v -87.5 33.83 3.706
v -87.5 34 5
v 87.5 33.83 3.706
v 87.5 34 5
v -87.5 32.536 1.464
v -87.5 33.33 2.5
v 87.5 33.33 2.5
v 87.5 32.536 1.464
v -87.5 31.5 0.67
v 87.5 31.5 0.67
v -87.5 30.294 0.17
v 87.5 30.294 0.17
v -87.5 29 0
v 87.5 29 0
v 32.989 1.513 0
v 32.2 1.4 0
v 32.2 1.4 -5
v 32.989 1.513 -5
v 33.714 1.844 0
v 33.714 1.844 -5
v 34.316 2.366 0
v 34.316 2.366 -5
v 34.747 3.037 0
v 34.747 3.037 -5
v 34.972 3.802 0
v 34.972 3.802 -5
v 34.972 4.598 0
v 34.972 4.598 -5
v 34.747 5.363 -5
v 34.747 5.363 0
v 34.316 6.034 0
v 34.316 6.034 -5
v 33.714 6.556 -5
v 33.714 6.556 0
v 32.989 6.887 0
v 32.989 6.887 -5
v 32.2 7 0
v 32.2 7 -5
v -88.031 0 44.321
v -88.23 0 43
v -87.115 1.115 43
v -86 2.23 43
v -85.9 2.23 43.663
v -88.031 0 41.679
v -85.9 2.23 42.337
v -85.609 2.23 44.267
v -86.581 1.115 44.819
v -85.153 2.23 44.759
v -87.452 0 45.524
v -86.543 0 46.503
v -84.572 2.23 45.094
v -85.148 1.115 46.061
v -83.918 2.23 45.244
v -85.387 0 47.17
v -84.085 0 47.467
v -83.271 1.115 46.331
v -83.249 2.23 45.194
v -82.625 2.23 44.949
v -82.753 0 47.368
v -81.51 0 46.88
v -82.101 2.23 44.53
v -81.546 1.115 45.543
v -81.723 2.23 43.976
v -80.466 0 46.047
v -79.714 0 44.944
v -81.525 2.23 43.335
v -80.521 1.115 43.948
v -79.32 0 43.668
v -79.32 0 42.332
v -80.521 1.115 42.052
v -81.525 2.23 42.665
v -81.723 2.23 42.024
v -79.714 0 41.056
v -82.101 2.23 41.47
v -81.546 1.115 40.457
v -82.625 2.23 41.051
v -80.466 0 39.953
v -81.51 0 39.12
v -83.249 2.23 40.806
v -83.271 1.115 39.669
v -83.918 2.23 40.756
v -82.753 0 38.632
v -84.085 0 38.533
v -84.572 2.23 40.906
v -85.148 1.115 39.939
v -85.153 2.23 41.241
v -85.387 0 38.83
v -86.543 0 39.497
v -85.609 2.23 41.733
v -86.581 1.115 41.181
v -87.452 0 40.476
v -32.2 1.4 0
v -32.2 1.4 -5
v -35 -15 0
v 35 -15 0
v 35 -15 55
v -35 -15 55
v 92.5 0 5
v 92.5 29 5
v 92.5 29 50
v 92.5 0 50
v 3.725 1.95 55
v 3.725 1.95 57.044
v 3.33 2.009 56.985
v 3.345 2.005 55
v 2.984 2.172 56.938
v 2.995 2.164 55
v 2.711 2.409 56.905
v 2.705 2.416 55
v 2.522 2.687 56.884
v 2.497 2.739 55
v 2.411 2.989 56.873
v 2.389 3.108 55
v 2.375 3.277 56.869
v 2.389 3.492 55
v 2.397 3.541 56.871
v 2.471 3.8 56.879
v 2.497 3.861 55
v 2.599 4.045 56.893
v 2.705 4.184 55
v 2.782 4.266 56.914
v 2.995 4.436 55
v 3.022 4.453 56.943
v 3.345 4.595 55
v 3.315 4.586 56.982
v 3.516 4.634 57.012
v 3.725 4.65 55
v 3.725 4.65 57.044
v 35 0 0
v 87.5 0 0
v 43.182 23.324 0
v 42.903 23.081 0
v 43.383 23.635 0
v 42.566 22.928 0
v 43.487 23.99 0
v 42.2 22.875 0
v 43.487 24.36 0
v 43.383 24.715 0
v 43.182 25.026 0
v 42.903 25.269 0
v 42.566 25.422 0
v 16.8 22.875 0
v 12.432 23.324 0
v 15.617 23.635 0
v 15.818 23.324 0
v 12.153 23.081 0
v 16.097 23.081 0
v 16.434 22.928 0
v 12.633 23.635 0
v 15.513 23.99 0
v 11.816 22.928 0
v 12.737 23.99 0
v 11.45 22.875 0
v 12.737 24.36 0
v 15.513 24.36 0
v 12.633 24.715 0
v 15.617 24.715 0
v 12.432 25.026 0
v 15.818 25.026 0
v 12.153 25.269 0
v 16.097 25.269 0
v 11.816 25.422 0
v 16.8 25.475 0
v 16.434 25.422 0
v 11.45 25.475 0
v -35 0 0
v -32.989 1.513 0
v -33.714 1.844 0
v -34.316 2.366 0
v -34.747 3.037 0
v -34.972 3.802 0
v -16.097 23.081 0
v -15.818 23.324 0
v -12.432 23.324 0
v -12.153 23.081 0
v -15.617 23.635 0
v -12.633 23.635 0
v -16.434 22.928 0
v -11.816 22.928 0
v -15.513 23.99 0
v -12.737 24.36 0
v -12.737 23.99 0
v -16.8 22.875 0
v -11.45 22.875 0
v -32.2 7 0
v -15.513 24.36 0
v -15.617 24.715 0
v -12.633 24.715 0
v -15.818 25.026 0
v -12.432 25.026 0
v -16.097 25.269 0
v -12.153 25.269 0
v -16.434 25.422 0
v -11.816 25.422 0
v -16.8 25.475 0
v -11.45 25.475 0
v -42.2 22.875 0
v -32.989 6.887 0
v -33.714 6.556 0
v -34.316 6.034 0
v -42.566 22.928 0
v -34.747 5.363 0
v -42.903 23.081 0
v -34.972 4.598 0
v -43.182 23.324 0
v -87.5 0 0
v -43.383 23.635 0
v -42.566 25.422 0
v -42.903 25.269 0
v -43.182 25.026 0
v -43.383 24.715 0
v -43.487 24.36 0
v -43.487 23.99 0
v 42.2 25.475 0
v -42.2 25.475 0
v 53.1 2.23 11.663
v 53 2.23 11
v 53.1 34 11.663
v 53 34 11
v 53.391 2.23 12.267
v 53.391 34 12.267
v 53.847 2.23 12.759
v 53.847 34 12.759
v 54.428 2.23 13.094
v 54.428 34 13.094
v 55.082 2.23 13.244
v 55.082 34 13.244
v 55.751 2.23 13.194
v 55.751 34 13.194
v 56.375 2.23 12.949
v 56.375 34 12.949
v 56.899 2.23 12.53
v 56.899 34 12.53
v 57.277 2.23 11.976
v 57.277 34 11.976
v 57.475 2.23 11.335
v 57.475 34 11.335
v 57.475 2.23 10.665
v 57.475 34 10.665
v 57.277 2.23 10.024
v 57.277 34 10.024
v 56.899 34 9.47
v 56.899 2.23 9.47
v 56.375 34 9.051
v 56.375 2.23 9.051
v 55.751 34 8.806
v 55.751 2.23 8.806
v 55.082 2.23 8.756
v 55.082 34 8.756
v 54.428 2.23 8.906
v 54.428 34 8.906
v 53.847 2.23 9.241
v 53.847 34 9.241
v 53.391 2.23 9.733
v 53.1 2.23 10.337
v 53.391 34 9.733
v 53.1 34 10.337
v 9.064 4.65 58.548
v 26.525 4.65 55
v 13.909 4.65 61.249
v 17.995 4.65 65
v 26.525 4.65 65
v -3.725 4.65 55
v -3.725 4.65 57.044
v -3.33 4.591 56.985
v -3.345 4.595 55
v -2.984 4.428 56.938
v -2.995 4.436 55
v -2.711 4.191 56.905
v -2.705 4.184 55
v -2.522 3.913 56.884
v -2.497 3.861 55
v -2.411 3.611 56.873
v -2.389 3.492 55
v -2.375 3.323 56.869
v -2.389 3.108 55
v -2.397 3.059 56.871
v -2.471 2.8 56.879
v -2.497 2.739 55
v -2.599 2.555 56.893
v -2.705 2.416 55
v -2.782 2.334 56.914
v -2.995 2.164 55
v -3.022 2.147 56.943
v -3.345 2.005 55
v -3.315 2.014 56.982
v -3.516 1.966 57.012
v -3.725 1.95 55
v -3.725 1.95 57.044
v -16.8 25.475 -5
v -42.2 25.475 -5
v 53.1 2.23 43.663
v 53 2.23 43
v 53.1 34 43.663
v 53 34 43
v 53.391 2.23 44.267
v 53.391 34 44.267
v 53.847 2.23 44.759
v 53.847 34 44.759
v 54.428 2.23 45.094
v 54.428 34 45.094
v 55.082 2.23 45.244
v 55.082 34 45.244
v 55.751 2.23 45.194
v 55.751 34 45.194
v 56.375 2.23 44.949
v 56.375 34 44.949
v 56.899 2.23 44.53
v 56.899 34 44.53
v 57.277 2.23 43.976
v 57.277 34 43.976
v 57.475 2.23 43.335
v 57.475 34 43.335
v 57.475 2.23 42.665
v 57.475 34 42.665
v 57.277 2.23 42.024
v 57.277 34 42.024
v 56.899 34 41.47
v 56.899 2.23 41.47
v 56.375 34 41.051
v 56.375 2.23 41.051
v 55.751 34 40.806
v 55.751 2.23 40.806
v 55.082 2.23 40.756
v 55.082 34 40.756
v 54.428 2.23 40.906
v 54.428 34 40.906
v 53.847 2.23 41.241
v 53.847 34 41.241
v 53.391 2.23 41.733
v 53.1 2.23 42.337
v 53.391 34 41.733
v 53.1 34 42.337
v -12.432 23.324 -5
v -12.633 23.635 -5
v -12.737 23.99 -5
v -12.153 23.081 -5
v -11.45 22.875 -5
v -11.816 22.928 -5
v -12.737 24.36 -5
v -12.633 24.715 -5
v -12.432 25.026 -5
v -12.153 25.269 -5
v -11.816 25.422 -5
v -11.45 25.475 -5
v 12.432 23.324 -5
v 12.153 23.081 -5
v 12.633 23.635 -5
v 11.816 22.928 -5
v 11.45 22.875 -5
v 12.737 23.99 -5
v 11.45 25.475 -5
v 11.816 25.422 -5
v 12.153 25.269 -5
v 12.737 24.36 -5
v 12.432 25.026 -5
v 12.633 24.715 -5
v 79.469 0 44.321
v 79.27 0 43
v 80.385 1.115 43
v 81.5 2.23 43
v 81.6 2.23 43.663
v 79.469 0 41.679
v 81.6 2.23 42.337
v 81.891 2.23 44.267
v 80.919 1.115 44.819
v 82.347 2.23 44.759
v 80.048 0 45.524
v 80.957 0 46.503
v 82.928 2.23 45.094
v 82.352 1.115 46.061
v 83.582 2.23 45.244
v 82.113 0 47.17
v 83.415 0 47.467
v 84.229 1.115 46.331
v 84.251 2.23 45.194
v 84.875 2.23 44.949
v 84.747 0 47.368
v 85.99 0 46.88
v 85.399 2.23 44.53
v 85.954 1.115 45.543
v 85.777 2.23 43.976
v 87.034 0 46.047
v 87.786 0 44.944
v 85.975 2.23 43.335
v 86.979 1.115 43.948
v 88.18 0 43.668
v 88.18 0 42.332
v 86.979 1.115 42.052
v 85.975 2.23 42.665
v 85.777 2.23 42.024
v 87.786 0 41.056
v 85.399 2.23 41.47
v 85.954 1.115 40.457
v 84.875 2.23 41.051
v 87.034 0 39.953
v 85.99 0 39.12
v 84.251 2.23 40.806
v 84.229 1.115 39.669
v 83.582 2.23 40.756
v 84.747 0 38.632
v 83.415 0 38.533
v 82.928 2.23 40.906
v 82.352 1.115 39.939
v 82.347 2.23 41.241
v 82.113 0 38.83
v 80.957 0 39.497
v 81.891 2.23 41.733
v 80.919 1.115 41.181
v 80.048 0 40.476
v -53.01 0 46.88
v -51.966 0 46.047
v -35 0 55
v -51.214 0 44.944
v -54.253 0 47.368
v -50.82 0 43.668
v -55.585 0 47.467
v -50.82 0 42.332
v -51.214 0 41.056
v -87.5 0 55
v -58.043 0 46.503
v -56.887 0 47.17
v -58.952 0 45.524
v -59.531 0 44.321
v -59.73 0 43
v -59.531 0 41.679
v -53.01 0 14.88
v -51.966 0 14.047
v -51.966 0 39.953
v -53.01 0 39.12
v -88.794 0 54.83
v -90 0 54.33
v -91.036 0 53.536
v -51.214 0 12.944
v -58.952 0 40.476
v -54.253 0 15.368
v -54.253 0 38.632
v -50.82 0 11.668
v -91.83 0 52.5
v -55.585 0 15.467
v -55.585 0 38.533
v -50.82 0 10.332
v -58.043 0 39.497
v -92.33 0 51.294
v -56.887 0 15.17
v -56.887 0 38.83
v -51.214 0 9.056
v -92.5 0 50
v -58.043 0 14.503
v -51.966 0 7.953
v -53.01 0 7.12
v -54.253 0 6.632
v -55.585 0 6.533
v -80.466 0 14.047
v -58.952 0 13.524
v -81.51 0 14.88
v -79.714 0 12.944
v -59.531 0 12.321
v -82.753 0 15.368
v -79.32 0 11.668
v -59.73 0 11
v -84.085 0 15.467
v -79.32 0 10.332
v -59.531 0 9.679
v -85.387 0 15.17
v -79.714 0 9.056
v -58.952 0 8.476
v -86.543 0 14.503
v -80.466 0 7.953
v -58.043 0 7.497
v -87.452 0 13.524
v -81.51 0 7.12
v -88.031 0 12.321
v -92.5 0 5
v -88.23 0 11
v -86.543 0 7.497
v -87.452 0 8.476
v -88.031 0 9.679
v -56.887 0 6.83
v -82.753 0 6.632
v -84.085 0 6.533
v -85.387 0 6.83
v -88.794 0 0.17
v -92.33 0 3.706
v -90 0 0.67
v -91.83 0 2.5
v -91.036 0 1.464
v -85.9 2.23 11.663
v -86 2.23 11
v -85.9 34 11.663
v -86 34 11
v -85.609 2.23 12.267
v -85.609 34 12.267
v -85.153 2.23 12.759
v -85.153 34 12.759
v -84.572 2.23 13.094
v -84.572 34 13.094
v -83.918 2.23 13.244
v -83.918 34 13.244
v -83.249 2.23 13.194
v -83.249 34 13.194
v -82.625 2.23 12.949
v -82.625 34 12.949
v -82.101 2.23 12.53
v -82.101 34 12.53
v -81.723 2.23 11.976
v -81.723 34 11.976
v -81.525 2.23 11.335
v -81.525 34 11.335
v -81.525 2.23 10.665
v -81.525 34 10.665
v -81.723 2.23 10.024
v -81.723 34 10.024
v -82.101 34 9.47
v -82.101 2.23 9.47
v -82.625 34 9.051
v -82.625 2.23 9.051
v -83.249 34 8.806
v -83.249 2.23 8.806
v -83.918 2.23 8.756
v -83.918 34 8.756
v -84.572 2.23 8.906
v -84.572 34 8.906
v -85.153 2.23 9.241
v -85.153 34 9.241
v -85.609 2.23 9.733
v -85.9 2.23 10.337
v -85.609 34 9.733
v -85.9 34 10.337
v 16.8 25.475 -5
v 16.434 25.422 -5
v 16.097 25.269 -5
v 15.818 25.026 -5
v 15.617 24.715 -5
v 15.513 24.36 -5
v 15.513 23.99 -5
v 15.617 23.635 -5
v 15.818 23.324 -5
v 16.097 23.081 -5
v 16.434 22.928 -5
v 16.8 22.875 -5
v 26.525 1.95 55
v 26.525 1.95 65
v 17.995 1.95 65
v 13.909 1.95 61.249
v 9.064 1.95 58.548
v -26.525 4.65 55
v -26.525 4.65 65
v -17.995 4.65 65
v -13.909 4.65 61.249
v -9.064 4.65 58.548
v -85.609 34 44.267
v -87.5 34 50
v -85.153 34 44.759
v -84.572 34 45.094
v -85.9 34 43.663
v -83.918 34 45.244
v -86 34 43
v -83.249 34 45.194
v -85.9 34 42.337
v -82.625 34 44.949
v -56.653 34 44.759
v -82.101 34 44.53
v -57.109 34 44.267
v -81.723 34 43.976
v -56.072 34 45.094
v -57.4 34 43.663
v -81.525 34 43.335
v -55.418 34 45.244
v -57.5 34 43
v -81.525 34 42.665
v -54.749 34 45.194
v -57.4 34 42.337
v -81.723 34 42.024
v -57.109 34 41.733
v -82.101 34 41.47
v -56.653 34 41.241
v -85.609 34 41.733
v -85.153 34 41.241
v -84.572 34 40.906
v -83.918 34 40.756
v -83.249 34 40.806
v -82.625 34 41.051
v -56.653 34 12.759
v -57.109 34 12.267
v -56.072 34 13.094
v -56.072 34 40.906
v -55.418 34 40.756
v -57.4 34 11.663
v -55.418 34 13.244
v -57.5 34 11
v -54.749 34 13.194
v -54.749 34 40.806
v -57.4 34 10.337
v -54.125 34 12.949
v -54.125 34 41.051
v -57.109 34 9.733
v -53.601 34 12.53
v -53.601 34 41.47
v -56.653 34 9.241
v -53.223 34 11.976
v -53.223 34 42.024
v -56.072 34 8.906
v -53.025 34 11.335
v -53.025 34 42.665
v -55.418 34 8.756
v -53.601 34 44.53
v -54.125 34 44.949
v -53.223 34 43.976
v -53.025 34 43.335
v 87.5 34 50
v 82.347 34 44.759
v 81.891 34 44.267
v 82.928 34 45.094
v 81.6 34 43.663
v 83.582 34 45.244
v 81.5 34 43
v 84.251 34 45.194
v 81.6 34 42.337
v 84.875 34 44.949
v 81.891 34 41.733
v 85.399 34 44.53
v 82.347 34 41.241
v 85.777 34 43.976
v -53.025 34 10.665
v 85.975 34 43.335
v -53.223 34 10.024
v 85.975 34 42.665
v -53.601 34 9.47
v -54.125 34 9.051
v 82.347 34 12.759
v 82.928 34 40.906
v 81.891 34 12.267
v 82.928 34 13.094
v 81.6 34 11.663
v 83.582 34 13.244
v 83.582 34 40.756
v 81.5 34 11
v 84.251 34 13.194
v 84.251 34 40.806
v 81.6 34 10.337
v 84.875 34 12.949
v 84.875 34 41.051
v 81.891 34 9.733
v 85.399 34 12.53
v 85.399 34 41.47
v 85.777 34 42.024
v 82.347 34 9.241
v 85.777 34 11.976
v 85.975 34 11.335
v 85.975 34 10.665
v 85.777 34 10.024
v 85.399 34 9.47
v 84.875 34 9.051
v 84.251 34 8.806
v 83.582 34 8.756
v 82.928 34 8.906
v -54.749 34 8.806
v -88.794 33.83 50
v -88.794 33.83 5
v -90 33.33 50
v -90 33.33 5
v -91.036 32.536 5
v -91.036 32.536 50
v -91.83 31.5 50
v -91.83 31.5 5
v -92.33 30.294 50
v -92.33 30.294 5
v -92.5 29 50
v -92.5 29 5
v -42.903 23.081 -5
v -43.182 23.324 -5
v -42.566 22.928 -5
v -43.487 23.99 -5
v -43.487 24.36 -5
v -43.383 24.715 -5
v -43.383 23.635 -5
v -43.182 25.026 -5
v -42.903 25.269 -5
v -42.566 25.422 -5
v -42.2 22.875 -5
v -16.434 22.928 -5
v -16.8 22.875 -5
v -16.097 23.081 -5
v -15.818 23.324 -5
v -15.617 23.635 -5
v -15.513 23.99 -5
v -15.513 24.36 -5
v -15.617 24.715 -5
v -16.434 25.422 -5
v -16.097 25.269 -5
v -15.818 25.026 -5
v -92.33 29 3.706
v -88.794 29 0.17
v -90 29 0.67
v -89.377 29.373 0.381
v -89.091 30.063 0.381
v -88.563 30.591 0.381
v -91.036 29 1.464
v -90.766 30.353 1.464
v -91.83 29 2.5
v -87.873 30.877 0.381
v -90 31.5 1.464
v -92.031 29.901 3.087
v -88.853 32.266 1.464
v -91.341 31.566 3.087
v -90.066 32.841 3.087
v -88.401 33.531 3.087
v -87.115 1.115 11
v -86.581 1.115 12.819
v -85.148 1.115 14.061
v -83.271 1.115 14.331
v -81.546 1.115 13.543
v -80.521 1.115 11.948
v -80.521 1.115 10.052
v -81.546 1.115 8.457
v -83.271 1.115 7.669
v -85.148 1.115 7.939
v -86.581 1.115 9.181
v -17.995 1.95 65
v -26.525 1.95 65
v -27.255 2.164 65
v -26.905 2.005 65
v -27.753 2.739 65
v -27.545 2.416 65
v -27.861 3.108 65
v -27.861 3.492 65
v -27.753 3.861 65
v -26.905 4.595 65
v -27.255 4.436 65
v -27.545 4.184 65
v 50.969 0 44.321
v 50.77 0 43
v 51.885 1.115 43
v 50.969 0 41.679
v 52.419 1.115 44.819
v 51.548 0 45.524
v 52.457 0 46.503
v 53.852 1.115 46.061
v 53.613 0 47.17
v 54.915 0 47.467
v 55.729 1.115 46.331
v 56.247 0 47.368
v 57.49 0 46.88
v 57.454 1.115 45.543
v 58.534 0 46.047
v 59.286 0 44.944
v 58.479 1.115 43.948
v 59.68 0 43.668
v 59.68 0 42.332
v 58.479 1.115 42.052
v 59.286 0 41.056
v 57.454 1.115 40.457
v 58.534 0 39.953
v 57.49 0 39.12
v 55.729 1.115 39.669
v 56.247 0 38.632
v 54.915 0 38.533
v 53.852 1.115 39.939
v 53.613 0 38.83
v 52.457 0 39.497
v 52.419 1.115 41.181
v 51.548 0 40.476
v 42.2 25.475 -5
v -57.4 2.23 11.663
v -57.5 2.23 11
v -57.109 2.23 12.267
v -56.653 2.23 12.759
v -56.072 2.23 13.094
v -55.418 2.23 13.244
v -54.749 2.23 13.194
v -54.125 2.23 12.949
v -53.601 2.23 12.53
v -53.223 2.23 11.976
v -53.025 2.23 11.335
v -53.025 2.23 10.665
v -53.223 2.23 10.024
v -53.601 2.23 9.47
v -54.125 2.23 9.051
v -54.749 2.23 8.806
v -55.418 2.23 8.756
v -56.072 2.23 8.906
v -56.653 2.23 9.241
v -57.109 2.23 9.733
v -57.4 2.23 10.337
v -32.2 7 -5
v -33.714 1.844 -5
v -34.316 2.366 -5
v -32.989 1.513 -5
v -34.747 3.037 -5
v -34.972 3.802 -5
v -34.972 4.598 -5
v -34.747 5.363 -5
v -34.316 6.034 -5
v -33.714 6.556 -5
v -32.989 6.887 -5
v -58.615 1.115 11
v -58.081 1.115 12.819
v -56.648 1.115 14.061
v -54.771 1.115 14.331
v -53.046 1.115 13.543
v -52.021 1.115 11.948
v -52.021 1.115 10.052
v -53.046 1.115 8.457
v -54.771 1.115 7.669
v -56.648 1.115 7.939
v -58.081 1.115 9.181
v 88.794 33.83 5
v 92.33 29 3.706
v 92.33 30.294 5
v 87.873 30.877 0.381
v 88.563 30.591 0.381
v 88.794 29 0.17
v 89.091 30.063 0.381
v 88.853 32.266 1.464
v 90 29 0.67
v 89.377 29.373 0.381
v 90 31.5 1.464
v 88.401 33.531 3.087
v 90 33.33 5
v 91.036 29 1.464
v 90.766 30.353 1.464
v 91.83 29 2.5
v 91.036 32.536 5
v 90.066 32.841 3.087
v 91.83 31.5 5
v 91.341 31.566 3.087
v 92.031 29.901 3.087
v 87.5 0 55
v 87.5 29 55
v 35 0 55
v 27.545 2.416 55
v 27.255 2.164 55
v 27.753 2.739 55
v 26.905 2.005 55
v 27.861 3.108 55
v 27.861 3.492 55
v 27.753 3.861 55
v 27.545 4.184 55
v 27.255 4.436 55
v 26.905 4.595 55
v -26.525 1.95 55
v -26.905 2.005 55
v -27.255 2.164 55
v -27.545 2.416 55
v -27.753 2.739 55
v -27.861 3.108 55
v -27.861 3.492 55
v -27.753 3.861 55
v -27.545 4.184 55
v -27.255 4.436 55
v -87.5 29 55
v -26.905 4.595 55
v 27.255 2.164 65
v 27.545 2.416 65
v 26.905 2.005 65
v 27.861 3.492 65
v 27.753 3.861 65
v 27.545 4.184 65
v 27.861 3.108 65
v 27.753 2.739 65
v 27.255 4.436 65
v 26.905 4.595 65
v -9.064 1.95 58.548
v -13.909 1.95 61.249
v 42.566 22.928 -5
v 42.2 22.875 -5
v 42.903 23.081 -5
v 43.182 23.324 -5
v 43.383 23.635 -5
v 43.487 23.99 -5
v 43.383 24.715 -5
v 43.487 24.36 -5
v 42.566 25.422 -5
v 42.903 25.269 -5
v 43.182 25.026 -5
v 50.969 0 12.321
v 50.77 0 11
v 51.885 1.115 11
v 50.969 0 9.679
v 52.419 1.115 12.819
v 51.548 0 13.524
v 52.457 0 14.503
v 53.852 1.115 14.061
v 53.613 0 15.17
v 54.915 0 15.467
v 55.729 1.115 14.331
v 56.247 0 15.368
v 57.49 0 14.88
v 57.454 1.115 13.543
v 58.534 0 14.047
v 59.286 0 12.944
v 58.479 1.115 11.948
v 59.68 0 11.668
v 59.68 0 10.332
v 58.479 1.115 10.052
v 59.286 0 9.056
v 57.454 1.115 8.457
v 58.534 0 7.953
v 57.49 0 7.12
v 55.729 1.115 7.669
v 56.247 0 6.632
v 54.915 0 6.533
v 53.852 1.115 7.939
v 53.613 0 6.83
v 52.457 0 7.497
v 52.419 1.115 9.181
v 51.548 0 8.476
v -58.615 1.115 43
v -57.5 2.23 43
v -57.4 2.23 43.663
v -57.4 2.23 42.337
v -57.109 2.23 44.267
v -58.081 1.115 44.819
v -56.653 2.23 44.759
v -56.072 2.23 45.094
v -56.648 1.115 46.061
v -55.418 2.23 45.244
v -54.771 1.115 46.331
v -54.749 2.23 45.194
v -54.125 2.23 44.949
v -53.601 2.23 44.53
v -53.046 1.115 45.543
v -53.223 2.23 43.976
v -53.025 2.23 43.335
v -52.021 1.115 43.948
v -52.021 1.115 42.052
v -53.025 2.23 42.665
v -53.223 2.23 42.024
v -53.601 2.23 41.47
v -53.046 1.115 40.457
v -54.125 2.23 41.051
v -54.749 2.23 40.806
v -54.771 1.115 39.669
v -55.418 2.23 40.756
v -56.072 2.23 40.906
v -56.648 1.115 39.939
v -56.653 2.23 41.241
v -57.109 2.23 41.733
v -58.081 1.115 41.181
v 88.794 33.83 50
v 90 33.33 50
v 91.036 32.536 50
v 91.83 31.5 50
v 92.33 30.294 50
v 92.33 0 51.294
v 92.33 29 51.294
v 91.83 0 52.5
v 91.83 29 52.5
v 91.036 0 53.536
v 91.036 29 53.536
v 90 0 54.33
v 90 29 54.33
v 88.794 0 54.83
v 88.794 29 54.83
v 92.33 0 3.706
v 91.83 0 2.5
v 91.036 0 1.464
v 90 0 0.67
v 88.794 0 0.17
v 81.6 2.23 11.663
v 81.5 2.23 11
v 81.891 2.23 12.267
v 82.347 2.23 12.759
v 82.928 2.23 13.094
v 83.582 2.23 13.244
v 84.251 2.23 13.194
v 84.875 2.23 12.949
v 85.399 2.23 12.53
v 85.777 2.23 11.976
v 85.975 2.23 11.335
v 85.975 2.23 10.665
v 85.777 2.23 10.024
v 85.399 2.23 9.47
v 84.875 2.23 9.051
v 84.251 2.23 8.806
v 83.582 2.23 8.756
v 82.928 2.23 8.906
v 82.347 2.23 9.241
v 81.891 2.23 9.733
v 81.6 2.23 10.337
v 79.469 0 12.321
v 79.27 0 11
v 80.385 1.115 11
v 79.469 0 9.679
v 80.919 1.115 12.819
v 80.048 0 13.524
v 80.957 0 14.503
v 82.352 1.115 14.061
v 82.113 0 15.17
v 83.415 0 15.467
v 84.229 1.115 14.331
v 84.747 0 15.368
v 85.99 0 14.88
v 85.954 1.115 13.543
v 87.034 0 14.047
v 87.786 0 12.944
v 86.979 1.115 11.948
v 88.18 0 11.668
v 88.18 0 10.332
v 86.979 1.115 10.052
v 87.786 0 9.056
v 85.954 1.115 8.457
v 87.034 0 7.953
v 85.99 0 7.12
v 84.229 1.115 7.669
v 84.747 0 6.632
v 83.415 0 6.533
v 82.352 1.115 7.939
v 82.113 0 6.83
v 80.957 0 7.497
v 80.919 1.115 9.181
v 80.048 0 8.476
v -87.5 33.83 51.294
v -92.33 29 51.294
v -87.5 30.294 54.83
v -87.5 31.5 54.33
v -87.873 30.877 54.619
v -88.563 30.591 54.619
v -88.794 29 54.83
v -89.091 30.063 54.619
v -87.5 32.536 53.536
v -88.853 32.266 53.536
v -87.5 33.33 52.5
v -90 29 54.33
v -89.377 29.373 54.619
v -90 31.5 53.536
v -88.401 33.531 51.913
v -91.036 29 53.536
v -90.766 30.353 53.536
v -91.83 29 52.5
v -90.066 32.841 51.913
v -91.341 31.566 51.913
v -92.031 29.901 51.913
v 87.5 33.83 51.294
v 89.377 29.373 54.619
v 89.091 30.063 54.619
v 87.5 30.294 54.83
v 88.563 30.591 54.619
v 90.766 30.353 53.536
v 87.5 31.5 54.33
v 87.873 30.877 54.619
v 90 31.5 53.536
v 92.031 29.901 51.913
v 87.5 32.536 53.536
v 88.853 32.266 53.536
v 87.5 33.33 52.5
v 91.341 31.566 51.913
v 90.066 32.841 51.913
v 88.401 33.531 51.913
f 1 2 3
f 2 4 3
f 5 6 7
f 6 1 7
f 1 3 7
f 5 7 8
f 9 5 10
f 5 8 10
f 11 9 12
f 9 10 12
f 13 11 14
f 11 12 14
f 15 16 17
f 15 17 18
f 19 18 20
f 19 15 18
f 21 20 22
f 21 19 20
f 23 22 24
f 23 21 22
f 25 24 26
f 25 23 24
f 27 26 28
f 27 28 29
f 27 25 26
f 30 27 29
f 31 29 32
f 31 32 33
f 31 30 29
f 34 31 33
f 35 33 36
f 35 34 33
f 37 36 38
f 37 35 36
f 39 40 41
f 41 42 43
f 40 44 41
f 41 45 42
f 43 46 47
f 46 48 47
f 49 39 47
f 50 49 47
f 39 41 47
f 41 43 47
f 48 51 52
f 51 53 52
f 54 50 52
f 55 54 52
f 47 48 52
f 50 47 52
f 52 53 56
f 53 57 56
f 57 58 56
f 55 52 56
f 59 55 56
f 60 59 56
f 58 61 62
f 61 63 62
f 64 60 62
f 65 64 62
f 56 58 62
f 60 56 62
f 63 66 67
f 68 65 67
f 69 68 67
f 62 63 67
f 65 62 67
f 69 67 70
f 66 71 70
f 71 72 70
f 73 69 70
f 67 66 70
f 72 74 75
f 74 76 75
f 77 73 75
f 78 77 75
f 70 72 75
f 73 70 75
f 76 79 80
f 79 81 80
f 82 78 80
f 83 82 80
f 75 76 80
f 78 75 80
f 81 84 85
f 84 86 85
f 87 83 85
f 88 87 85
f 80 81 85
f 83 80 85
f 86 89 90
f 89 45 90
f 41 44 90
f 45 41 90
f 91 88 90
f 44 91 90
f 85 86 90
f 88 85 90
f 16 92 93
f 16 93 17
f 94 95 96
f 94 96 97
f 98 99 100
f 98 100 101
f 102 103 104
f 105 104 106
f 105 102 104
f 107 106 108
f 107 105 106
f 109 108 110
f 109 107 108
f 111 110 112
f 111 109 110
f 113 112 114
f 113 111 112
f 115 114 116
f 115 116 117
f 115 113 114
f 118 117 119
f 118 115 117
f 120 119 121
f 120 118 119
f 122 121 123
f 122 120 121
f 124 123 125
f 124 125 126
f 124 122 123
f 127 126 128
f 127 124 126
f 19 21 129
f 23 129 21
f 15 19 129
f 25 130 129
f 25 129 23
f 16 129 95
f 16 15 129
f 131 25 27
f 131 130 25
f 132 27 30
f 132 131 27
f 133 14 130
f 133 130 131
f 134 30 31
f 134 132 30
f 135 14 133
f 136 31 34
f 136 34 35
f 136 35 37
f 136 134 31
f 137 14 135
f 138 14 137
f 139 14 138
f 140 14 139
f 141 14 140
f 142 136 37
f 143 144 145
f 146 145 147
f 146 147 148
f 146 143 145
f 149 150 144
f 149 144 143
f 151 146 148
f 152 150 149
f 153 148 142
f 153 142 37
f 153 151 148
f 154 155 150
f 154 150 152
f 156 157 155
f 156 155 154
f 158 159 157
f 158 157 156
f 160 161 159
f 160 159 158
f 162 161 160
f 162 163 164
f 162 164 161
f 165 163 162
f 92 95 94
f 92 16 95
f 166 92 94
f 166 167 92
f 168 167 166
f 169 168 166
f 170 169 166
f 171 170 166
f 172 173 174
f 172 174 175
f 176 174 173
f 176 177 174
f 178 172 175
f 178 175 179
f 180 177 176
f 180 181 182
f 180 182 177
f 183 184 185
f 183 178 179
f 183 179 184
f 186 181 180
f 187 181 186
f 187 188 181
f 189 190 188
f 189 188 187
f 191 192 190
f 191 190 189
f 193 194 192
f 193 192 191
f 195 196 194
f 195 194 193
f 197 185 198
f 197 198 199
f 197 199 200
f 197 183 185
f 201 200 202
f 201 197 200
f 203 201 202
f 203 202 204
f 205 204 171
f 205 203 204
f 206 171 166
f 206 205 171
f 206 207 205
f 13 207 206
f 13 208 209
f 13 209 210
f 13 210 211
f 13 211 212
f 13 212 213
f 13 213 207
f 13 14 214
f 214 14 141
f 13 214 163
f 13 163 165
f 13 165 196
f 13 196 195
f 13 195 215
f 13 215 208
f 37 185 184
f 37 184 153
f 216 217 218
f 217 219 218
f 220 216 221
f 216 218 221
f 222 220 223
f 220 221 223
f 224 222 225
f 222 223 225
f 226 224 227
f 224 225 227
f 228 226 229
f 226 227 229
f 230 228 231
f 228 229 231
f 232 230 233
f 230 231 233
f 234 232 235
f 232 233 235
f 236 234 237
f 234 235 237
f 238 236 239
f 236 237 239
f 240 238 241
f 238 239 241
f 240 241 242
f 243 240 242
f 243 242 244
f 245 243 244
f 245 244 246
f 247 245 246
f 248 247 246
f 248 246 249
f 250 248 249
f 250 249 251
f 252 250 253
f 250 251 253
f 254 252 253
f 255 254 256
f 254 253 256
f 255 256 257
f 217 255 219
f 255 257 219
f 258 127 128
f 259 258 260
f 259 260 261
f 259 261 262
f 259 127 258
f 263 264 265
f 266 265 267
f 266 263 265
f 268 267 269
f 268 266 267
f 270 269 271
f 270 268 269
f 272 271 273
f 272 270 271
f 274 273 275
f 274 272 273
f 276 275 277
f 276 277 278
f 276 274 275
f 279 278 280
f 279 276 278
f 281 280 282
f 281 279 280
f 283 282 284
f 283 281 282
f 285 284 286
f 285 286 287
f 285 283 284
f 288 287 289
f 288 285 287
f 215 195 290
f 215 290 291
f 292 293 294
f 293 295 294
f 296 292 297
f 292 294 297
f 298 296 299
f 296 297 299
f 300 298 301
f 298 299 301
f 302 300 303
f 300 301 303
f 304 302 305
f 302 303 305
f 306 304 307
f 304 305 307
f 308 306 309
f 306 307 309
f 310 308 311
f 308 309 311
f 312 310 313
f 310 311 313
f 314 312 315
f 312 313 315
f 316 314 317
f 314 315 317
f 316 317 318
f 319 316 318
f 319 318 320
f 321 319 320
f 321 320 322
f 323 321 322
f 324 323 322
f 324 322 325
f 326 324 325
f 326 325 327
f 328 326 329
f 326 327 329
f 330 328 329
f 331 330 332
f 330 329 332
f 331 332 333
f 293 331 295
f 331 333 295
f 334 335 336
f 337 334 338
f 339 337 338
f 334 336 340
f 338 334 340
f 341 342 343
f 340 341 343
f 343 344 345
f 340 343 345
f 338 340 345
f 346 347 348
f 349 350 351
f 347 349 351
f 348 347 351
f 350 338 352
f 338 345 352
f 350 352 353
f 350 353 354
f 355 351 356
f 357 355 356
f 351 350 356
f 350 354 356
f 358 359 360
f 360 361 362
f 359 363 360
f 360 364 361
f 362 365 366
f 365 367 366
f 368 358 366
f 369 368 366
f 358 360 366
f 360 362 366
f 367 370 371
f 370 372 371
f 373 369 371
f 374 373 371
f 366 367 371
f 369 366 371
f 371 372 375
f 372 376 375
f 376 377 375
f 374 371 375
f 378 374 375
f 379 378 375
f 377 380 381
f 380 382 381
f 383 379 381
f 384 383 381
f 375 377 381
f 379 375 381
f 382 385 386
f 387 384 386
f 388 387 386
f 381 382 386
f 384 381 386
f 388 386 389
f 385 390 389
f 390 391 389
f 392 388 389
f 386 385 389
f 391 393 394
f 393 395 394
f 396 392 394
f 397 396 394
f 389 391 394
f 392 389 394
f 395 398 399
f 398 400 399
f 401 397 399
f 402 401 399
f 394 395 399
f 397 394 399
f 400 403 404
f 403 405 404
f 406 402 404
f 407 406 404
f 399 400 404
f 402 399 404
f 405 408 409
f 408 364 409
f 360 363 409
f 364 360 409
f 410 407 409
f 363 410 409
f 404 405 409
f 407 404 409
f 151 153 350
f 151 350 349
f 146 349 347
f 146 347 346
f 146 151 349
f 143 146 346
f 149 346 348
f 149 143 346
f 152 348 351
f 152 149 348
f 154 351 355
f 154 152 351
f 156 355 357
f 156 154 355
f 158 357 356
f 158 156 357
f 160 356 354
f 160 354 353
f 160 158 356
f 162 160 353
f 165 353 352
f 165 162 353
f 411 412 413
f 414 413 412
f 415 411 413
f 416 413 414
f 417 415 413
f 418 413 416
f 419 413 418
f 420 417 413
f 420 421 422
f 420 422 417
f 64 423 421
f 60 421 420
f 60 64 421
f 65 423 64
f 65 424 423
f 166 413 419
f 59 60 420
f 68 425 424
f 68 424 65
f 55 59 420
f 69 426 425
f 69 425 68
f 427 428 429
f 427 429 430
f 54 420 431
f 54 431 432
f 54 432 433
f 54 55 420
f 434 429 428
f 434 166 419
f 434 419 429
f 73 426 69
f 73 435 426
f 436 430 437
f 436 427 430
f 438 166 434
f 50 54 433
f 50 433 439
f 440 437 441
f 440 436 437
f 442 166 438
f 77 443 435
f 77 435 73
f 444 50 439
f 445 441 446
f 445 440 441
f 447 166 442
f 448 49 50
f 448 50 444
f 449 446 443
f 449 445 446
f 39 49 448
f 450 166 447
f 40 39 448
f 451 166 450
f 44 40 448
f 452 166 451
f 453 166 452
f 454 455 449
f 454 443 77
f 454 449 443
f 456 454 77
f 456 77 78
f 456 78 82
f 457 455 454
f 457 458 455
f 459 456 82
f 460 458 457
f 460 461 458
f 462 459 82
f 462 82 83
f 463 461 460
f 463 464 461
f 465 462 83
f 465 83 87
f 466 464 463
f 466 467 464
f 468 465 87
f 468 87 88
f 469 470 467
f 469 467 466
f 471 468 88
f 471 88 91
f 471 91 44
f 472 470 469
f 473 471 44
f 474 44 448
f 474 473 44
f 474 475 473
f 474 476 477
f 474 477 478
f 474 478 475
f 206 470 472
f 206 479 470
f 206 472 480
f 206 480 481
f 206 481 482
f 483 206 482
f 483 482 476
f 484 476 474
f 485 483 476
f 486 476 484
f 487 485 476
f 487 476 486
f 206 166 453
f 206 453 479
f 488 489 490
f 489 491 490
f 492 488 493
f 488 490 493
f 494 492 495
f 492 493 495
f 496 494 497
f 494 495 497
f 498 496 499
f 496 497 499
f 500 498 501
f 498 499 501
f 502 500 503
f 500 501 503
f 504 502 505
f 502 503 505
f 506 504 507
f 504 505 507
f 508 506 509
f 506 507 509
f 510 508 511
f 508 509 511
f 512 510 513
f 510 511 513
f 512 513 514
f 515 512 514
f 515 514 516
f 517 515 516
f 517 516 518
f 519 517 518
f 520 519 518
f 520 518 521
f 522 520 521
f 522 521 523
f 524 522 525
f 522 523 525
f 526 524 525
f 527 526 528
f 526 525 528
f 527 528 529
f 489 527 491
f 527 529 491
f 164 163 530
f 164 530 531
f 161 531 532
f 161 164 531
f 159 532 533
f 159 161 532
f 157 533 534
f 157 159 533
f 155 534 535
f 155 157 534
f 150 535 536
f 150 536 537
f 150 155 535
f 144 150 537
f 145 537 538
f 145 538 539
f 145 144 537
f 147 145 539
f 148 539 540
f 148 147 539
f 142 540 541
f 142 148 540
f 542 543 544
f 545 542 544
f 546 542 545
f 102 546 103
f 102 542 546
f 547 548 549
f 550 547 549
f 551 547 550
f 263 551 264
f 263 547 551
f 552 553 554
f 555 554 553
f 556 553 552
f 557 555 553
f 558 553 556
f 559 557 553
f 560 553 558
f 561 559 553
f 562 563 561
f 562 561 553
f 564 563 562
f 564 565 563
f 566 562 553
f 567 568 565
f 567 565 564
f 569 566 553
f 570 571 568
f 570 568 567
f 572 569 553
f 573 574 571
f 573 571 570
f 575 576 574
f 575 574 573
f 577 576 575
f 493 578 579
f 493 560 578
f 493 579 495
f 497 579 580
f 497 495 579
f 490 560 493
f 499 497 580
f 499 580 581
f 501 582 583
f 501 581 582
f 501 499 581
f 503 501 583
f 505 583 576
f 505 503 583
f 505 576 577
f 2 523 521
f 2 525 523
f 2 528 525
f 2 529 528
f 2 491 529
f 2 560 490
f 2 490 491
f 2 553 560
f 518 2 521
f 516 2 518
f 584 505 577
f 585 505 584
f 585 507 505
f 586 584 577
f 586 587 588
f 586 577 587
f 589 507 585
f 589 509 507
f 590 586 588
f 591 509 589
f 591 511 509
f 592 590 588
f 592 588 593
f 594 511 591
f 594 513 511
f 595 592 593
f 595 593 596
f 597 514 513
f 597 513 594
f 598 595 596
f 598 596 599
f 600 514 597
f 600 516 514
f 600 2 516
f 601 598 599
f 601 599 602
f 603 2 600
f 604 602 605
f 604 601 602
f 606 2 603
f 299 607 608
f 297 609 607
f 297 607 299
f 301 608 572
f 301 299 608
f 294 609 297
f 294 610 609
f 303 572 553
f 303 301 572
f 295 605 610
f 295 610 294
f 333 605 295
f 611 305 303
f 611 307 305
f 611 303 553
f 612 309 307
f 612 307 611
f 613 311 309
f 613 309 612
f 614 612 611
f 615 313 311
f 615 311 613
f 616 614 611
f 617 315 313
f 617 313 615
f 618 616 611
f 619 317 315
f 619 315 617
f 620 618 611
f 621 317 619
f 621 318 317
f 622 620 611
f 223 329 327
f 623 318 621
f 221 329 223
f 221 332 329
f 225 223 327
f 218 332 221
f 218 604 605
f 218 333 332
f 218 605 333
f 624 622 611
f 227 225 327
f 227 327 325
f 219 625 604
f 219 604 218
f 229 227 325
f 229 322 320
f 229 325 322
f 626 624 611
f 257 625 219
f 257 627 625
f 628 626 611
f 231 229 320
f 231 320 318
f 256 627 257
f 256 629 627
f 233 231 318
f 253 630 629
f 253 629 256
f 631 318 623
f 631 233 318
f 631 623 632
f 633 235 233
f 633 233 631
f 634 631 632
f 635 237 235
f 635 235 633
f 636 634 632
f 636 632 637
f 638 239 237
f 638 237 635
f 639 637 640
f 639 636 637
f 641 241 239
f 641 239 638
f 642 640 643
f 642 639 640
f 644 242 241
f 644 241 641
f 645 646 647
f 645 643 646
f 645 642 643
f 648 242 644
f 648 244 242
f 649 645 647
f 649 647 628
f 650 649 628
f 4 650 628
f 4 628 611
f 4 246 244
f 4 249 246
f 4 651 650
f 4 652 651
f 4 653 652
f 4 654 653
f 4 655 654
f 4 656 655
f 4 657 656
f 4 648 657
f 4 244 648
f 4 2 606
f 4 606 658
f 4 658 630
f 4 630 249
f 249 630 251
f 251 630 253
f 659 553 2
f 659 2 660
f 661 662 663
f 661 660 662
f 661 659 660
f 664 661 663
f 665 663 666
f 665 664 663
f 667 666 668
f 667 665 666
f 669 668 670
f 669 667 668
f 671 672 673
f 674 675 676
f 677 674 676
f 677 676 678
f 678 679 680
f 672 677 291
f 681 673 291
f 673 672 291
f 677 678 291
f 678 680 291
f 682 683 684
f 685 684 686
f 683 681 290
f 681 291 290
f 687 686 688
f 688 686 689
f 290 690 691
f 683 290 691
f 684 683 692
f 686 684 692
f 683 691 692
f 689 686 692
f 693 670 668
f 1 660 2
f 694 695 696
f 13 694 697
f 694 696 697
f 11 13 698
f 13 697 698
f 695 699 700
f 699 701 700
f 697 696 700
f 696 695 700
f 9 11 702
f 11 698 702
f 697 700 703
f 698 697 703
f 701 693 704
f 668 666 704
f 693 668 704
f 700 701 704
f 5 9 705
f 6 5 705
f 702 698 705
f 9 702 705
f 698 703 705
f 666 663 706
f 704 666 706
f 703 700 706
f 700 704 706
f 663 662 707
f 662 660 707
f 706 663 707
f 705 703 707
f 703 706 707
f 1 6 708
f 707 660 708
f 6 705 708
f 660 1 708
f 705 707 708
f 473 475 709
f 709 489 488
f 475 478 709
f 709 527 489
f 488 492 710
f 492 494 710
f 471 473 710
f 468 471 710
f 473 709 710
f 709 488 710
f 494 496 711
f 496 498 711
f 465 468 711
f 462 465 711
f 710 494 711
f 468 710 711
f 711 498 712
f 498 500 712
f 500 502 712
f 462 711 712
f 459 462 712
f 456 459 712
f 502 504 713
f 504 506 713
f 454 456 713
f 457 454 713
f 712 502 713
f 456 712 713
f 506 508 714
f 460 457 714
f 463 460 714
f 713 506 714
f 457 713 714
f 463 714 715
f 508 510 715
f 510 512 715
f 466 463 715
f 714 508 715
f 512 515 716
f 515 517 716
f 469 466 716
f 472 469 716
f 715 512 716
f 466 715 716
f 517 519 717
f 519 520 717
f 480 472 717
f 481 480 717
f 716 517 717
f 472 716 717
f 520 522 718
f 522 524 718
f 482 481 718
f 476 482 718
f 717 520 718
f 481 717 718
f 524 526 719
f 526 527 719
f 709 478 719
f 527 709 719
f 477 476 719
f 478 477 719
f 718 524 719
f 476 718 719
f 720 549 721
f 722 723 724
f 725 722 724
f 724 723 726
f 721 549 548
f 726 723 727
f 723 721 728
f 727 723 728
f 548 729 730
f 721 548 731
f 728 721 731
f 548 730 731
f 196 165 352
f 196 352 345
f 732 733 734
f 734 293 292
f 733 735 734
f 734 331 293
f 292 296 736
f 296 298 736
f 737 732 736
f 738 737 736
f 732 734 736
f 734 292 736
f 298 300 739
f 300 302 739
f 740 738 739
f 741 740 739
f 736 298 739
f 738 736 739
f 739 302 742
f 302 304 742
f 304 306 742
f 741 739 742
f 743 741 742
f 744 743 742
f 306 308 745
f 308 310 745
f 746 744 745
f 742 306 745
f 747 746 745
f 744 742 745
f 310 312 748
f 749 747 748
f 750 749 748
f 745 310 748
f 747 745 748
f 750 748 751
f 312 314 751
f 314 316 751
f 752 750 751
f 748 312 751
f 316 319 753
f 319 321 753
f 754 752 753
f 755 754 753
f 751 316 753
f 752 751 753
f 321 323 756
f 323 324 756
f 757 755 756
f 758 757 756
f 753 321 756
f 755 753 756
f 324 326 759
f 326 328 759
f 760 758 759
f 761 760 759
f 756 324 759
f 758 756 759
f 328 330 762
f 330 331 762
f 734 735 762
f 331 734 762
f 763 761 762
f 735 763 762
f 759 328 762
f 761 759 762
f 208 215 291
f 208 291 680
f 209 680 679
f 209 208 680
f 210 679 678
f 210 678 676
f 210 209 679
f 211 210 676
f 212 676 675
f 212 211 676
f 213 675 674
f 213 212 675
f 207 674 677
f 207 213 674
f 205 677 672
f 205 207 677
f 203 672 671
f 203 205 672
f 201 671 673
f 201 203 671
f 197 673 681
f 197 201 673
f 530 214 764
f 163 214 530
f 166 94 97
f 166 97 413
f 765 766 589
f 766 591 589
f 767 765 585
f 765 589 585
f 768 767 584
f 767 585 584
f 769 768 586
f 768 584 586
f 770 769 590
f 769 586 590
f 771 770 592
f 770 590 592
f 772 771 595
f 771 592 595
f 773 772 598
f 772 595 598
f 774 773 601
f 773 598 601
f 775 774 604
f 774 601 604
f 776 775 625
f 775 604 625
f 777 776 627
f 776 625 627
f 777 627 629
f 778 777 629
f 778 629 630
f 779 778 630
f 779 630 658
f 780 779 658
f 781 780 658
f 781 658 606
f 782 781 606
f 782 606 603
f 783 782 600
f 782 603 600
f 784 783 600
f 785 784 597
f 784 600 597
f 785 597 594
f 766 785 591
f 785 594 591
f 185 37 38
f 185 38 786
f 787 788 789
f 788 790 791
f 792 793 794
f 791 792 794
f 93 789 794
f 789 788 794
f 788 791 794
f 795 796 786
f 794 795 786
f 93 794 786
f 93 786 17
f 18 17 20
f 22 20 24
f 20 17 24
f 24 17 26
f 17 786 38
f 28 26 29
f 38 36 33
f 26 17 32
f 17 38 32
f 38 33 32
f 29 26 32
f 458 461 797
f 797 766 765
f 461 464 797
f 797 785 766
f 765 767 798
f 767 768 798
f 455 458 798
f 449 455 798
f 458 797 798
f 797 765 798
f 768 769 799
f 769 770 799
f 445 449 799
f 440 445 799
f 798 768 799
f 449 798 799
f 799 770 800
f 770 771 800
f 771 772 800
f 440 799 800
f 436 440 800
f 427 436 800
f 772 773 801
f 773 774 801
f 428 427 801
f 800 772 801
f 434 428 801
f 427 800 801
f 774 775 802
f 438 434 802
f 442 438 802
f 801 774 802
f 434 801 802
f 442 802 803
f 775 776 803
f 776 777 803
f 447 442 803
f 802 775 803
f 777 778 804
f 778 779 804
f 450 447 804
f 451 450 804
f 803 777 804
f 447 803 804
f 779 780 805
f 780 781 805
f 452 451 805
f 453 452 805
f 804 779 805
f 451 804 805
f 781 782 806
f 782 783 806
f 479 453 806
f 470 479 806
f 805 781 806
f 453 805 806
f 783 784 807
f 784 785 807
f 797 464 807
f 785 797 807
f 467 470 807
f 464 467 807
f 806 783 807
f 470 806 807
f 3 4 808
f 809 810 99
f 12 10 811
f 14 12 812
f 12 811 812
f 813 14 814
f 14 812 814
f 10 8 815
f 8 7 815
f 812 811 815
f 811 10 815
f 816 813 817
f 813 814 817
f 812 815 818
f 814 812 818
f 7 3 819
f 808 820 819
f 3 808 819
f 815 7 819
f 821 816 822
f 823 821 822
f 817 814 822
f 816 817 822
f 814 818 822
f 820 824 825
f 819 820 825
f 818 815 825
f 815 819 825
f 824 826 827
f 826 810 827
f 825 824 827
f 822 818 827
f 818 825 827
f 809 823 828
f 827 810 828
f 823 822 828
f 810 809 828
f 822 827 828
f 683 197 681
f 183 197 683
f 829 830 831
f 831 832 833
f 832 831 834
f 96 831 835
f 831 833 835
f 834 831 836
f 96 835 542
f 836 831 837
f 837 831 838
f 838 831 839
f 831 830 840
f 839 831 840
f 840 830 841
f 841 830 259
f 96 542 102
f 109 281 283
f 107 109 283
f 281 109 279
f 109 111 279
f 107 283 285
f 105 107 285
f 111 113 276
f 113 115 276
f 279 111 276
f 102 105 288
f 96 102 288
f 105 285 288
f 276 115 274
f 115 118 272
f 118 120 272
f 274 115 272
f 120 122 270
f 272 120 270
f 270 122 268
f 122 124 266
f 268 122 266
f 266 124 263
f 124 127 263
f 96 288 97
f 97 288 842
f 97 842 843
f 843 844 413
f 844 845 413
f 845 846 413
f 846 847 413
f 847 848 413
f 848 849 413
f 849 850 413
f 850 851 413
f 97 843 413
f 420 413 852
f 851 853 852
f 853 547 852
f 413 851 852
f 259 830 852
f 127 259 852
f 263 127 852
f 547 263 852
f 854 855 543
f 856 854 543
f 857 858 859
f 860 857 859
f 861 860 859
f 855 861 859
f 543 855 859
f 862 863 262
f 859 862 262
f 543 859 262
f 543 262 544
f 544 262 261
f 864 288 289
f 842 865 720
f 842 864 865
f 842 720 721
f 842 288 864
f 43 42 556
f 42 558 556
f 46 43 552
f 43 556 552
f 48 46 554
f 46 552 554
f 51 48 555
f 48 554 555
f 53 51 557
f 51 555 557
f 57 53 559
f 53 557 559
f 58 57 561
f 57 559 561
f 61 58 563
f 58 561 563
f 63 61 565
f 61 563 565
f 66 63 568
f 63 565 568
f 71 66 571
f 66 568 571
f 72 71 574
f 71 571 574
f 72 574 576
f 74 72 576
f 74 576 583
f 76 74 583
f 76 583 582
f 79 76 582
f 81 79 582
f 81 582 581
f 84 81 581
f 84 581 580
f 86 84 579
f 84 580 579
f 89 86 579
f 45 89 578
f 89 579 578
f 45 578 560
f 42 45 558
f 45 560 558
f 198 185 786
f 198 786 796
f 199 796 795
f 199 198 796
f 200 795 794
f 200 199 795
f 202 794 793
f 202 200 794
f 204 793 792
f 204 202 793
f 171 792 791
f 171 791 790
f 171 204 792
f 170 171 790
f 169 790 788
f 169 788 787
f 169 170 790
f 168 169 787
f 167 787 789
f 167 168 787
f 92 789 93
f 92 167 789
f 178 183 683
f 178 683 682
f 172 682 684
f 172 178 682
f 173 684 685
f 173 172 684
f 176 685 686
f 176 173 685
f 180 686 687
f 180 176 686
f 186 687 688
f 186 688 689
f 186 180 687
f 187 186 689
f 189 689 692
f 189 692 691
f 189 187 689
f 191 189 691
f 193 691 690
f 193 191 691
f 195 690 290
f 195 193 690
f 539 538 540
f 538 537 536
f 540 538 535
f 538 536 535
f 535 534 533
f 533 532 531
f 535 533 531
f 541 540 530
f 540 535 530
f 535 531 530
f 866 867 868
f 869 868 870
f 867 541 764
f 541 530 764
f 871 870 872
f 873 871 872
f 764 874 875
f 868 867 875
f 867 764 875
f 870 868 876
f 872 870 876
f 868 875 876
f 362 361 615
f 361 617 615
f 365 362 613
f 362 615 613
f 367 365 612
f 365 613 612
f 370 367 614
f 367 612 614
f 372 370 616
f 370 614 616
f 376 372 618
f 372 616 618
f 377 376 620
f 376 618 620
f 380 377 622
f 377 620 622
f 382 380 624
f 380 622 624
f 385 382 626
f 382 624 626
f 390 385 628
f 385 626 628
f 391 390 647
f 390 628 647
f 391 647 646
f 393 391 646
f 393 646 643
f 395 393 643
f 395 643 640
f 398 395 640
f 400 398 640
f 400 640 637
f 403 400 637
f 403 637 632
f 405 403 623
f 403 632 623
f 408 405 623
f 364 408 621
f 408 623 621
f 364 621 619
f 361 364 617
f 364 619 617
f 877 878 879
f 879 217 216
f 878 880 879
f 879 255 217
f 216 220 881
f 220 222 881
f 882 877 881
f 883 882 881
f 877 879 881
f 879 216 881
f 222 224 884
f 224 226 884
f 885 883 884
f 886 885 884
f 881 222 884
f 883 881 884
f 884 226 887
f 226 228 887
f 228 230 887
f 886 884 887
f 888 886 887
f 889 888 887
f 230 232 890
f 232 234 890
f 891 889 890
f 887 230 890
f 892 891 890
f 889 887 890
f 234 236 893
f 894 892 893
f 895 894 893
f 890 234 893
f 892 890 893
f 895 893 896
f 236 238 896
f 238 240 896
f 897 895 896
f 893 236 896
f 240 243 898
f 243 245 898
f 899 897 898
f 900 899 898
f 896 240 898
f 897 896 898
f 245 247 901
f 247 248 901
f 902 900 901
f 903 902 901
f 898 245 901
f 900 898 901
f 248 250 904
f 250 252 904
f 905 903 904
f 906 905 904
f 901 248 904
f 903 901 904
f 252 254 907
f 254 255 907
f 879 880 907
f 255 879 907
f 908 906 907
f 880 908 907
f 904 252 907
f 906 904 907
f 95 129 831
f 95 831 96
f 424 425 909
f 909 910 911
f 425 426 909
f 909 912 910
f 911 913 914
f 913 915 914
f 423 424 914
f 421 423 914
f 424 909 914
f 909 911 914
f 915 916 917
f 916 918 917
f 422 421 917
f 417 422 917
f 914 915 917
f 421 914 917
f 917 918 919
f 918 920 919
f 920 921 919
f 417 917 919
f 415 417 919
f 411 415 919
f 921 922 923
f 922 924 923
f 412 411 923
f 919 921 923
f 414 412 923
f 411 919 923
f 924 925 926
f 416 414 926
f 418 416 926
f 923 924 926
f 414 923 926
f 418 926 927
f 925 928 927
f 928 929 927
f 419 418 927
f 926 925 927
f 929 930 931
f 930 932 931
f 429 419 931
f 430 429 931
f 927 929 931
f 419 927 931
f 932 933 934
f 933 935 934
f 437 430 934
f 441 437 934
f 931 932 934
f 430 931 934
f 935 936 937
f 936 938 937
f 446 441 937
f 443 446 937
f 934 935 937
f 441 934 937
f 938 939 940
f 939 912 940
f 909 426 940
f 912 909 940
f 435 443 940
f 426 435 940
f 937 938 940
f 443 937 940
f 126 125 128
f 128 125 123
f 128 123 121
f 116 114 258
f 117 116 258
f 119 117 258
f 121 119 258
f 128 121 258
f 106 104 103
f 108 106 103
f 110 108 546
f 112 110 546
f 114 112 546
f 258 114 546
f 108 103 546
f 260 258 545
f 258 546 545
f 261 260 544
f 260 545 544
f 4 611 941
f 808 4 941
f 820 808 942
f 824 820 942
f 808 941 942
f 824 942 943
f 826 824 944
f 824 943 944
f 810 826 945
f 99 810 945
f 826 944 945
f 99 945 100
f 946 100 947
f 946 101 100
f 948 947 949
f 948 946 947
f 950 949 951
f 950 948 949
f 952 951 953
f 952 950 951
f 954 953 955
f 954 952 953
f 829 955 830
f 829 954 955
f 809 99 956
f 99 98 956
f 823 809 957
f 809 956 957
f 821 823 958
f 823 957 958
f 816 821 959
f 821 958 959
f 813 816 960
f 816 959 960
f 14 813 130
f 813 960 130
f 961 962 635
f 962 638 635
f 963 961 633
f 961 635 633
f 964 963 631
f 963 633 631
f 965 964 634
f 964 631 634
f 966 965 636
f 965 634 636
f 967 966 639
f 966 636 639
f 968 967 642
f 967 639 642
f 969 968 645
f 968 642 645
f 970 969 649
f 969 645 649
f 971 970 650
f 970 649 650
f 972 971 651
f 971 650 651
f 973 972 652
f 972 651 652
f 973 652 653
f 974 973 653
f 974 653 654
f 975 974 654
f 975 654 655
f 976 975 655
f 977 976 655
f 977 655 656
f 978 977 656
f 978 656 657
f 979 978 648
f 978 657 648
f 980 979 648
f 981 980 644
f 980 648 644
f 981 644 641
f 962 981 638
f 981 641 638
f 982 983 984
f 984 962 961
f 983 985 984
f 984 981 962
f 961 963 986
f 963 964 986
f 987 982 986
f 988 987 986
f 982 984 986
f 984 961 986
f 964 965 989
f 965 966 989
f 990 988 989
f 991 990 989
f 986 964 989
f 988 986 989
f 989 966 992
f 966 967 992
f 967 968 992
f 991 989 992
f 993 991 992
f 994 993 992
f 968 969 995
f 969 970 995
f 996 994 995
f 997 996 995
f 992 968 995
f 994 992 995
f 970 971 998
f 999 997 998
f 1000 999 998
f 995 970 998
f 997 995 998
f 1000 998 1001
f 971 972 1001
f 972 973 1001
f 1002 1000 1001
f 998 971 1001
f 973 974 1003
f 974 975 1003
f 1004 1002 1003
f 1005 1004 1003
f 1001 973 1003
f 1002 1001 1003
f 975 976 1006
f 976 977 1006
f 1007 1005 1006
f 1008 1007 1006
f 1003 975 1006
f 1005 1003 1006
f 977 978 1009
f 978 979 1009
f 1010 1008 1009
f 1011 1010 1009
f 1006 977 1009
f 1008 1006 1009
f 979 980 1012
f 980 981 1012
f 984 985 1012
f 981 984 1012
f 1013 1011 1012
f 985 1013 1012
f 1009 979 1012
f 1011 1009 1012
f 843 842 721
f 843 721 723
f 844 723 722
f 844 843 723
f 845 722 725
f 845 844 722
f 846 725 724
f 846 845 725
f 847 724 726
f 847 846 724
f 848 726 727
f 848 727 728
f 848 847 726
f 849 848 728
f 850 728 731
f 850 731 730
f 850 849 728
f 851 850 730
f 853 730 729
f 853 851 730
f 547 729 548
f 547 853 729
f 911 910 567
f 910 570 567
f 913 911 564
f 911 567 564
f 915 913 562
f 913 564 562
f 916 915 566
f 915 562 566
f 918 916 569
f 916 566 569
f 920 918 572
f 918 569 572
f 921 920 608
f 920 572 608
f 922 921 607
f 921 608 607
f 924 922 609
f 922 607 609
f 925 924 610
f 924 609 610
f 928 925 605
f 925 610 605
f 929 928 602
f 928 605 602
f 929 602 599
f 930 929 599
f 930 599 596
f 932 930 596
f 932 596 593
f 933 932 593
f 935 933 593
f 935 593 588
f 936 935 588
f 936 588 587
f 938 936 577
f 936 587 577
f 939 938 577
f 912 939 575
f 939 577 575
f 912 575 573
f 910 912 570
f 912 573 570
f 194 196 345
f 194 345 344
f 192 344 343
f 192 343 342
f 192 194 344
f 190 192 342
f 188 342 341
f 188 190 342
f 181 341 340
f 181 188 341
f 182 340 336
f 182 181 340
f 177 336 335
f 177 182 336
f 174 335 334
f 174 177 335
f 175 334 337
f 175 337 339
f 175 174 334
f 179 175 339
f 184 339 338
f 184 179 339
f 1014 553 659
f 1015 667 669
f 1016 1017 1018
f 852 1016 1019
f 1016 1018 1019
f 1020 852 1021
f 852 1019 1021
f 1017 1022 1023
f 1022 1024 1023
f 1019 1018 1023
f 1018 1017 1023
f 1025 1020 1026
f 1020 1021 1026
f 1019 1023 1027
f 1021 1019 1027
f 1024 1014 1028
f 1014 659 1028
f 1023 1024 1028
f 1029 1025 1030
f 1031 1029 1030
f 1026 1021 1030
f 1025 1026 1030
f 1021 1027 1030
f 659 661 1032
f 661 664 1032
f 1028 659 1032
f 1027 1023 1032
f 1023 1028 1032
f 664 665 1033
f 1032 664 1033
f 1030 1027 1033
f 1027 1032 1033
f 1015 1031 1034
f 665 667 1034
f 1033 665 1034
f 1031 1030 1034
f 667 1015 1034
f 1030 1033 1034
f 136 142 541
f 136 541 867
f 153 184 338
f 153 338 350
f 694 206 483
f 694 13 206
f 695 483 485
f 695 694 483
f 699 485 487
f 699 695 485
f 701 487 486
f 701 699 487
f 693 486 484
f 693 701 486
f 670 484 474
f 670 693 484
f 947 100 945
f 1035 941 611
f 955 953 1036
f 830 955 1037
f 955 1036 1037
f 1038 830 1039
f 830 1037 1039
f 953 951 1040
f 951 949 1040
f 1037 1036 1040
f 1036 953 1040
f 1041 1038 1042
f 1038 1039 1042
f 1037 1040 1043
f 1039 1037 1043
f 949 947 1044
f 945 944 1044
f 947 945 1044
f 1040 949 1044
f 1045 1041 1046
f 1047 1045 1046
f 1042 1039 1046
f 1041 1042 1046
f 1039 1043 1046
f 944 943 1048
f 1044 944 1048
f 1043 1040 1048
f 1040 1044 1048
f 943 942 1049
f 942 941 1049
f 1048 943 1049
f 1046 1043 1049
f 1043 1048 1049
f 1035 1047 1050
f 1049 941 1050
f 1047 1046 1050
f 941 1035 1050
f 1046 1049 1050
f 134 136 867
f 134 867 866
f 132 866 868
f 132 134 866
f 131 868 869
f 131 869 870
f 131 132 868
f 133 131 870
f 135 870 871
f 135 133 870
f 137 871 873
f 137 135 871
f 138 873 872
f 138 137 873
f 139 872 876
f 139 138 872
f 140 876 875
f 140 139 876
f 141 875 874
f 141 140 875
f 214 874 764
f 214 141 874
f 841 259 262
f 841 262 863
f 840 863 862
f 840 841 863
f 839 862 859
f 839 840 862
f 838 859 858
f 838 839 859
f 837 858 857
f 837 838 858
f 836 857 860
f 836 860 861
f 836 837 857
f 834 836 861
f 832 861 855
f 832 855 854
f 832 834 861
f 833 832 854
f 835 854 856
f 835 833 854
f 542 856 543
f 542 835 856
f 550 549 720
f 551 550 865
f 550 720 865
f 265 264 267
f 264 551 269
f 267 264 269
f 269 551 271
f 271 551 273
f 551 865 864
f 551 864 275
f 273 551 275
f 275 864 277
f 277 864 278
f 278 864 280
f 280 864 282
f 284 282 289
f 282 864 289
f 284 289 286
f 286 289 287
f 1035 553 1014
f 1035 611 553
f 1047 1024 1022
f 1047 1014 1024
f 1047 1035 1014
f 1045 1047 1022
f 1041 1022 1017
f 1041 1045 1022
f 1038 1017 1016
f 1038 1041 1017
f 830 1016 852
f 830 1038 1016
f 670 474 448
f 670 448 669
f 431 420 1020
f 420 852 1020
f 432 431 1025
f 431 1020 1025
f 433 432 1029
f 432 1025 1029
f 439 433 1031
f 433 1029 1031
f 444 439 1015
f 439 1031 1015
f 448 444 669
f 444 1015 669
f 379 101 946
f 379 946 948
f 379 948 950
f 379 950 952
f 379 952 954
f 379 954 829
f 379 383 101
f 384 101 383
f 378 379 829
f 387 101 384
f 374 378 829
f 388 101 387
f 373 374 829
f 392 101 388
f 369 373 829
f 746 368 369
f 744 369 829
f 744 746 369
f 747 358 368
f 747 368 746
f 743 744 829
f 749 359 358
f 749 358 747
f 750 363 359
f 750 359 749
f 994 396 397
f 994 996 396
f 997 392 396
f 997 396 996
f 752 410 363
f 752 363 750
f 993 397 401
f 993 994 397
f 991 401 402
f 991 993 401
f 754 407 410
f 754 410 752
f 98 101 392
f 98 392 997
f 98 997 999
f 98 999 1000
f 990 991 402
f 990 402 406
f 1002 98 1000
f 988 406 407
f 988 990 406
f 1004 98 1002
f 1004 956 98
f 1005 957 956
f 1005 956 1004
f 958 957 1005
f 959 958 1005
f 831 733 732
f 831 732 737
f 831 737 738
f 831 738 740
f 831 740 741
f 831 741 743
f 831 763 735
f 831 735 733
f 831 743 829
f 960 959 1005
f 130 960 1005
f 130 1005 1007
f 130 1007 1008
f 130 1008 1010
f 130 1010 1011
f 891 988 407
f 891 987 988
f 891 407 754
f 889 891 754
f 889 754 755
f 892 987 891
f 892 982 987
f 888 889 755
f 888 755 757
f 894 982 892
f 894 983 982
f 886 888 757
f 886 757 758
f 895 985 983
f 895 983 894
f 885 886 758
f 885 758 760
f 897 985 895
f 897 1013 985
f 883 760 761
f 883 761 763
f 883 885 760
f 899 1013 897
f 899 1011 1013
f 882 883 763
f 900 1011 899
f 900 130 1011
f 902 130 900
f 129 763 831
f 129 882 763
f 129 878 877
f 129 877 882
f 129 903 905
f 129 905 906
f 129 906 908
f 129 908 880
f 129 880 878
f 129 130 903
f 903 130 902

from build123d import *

# Parameters (mm, degrees)
BOSS_EXTRUDE1_DEPTH           = 55
BOSS_EXTRUDE4_DEPTH           = 10
BOSS_EXTRUDE3_DEPTH           = 5
CSK_FOR_M4_SFHCS2_D           = 4.5
CSK_FOR_M4_SFHCS2_CSINK_D     = 8.96
CSK_FOR_M4_SFHCS2_CSINK_ANGLE = 90
FILLET4_R                     = 5
SKETCH12_R                    = 23.75
CUT_EXTRUDE2_DEPTH            = 33.05


with BuildPart() as part:
    # Sketch2 → Boss-Extrude1 (new body)
    with BuildSketch(Plane.XY):
        Polygon((-92.5, 34), (92.5, 34), (92.5, 0), (35, 0), (35, -15), (-35, -15), (-35, 0), (-92.5, 0), align=None)
    extrude(amount=BOSS_EXTRUDE1_DEPTH)

    # Sketch4 → Boss-Extrude4 (add)
    with BuildSketch(Plane.XY.offset(55)):
        with BuildLine():
            Line((-26.525, 4.65), (-3.725, 4.65))
            ThreePointArc((-3.725, 4.65), (-2.375, 3.3), (-3.725, 1.95))
            Line((-3.725, 1.95), (-26.525, 1.95))
            ThreePointArc((-26.525, 1.95), (-27.875, 3.3), (-26.525, 4.65))
        make_face()
        with BuildLine():
            Line((26.525, 1.95), (3.725, 1.95))
            ThreePointArc((3.725, 1.95), (2.375, 3.3), (3.725, 4.65))
            Line((3.725, 4.65), (26.525, 4.65))
            ThreePointArc((26.525, 4.65), (27.875, 3.3), (26.525, 1.95))
        make_face()
    extrude(amount=BOSS_EXTRUDE4_DEPTH)

    # Sketch6 → Boss-Extrude3 (add)
    with BuildSketch(Plane(origin=(0, 0, 0), x_dir=(-1, 0, 0), z_dir=(0, 0, -1))):
        with BuildLine():
            Line((-11.45, 25.475), (11.45, 25.475))
            ThreePointArc((11.45, 25.475), (12.75, 24.175), (11.45, 22.875))
            Line((11.45, 22.875), (-11.45, 22.875))
            ThreePointArc((-11.45, 22.875), (-12.75, 24.175), (-11.45, 25.475))
        make_face()
        with BuildLine():
            Line((16.8, 25.475), (42.2, 25.475))
            ThreePointArc((42.2, 25.475), (43.5, 24.175), (42.2, 22.875))
            Line((42.2, 22.875), (16.8, 22.875))
            ThreePointArc((16.8, 22.875), (15.5, 24.175), (16.8, 25.475))
        make_face()
        with BuildLine():
            Line((-16.8, 22.875), (-42.2, 22.875))
            ThreePointArc((-42.2, 22.875), (-43.5, 24.175), (-42.2, 25.475))
            Line((-42.2, 25.475), (-16.8, 25.475))
            ThreePointArc((-16.8, 25.475), (-15.5, 24.175), (-16.8, 22.875))
        make_face()
        with BuildLine():
            Line((-32.2, 7), (32.2, 7))
            ThreePointArc((32.2, 7), (35, 4.2), (32.2, 1.4))
            Line((32.2, 1.4), (-32.2, 1.4))
            ThreePointArc((-32.2, 1.4), (-35, 4.2), (-32.2, 7))
        make_face()
    extrude(amount=BOSS_EXTRUDE3_DEPTH)

    # CSK for M4 SFHCS2 (through all)
    with Locations(Plane.XZ):
        with Locations((-83.75, 11), (-83.75, 43), (-55.25, 43), (55.25, 43), (83.75, 43), (83.75, 11), (55.25, 11), (-55.25, 11)):
            CounterSinkHole(CSK_FOR_M4_SFHCS2_D / 2, CSK_FOR_M4_SFHCS2_CSINK_D / 2, counter_sink_angle=CSK_FOR_M4_SFHCS2_CSINK_ANGLE)

    # Fillet4
    fillet4_edges = [part.edges().sort_by_distance(p)[0] for p in [
        (-92.5, 34, 27.5),
        (92.5, 34, 27.5),
        (92.5, 17, 55),
        (0, 34, 55),
        (-92.5, 17, 55),
        (-92.5, 17, 0),
        (0, 34, 0),
        (92.5, 17, 0),
    ]]
    fillet(fillet4_edges, radius=FILLET4_R)

    # Sketch12 → Cut-Extrude2 (cut, through all)
    with BuildSketch(Plane.XZ.offset(-1.95)):
        with Locations((0, 80.5)):
            Circle(SKETCH12_R)
    extrude(amount=-CUT_EXTRUDE2_DEPTH, mode=Mode.SUBTRACT)


solid = part.part
